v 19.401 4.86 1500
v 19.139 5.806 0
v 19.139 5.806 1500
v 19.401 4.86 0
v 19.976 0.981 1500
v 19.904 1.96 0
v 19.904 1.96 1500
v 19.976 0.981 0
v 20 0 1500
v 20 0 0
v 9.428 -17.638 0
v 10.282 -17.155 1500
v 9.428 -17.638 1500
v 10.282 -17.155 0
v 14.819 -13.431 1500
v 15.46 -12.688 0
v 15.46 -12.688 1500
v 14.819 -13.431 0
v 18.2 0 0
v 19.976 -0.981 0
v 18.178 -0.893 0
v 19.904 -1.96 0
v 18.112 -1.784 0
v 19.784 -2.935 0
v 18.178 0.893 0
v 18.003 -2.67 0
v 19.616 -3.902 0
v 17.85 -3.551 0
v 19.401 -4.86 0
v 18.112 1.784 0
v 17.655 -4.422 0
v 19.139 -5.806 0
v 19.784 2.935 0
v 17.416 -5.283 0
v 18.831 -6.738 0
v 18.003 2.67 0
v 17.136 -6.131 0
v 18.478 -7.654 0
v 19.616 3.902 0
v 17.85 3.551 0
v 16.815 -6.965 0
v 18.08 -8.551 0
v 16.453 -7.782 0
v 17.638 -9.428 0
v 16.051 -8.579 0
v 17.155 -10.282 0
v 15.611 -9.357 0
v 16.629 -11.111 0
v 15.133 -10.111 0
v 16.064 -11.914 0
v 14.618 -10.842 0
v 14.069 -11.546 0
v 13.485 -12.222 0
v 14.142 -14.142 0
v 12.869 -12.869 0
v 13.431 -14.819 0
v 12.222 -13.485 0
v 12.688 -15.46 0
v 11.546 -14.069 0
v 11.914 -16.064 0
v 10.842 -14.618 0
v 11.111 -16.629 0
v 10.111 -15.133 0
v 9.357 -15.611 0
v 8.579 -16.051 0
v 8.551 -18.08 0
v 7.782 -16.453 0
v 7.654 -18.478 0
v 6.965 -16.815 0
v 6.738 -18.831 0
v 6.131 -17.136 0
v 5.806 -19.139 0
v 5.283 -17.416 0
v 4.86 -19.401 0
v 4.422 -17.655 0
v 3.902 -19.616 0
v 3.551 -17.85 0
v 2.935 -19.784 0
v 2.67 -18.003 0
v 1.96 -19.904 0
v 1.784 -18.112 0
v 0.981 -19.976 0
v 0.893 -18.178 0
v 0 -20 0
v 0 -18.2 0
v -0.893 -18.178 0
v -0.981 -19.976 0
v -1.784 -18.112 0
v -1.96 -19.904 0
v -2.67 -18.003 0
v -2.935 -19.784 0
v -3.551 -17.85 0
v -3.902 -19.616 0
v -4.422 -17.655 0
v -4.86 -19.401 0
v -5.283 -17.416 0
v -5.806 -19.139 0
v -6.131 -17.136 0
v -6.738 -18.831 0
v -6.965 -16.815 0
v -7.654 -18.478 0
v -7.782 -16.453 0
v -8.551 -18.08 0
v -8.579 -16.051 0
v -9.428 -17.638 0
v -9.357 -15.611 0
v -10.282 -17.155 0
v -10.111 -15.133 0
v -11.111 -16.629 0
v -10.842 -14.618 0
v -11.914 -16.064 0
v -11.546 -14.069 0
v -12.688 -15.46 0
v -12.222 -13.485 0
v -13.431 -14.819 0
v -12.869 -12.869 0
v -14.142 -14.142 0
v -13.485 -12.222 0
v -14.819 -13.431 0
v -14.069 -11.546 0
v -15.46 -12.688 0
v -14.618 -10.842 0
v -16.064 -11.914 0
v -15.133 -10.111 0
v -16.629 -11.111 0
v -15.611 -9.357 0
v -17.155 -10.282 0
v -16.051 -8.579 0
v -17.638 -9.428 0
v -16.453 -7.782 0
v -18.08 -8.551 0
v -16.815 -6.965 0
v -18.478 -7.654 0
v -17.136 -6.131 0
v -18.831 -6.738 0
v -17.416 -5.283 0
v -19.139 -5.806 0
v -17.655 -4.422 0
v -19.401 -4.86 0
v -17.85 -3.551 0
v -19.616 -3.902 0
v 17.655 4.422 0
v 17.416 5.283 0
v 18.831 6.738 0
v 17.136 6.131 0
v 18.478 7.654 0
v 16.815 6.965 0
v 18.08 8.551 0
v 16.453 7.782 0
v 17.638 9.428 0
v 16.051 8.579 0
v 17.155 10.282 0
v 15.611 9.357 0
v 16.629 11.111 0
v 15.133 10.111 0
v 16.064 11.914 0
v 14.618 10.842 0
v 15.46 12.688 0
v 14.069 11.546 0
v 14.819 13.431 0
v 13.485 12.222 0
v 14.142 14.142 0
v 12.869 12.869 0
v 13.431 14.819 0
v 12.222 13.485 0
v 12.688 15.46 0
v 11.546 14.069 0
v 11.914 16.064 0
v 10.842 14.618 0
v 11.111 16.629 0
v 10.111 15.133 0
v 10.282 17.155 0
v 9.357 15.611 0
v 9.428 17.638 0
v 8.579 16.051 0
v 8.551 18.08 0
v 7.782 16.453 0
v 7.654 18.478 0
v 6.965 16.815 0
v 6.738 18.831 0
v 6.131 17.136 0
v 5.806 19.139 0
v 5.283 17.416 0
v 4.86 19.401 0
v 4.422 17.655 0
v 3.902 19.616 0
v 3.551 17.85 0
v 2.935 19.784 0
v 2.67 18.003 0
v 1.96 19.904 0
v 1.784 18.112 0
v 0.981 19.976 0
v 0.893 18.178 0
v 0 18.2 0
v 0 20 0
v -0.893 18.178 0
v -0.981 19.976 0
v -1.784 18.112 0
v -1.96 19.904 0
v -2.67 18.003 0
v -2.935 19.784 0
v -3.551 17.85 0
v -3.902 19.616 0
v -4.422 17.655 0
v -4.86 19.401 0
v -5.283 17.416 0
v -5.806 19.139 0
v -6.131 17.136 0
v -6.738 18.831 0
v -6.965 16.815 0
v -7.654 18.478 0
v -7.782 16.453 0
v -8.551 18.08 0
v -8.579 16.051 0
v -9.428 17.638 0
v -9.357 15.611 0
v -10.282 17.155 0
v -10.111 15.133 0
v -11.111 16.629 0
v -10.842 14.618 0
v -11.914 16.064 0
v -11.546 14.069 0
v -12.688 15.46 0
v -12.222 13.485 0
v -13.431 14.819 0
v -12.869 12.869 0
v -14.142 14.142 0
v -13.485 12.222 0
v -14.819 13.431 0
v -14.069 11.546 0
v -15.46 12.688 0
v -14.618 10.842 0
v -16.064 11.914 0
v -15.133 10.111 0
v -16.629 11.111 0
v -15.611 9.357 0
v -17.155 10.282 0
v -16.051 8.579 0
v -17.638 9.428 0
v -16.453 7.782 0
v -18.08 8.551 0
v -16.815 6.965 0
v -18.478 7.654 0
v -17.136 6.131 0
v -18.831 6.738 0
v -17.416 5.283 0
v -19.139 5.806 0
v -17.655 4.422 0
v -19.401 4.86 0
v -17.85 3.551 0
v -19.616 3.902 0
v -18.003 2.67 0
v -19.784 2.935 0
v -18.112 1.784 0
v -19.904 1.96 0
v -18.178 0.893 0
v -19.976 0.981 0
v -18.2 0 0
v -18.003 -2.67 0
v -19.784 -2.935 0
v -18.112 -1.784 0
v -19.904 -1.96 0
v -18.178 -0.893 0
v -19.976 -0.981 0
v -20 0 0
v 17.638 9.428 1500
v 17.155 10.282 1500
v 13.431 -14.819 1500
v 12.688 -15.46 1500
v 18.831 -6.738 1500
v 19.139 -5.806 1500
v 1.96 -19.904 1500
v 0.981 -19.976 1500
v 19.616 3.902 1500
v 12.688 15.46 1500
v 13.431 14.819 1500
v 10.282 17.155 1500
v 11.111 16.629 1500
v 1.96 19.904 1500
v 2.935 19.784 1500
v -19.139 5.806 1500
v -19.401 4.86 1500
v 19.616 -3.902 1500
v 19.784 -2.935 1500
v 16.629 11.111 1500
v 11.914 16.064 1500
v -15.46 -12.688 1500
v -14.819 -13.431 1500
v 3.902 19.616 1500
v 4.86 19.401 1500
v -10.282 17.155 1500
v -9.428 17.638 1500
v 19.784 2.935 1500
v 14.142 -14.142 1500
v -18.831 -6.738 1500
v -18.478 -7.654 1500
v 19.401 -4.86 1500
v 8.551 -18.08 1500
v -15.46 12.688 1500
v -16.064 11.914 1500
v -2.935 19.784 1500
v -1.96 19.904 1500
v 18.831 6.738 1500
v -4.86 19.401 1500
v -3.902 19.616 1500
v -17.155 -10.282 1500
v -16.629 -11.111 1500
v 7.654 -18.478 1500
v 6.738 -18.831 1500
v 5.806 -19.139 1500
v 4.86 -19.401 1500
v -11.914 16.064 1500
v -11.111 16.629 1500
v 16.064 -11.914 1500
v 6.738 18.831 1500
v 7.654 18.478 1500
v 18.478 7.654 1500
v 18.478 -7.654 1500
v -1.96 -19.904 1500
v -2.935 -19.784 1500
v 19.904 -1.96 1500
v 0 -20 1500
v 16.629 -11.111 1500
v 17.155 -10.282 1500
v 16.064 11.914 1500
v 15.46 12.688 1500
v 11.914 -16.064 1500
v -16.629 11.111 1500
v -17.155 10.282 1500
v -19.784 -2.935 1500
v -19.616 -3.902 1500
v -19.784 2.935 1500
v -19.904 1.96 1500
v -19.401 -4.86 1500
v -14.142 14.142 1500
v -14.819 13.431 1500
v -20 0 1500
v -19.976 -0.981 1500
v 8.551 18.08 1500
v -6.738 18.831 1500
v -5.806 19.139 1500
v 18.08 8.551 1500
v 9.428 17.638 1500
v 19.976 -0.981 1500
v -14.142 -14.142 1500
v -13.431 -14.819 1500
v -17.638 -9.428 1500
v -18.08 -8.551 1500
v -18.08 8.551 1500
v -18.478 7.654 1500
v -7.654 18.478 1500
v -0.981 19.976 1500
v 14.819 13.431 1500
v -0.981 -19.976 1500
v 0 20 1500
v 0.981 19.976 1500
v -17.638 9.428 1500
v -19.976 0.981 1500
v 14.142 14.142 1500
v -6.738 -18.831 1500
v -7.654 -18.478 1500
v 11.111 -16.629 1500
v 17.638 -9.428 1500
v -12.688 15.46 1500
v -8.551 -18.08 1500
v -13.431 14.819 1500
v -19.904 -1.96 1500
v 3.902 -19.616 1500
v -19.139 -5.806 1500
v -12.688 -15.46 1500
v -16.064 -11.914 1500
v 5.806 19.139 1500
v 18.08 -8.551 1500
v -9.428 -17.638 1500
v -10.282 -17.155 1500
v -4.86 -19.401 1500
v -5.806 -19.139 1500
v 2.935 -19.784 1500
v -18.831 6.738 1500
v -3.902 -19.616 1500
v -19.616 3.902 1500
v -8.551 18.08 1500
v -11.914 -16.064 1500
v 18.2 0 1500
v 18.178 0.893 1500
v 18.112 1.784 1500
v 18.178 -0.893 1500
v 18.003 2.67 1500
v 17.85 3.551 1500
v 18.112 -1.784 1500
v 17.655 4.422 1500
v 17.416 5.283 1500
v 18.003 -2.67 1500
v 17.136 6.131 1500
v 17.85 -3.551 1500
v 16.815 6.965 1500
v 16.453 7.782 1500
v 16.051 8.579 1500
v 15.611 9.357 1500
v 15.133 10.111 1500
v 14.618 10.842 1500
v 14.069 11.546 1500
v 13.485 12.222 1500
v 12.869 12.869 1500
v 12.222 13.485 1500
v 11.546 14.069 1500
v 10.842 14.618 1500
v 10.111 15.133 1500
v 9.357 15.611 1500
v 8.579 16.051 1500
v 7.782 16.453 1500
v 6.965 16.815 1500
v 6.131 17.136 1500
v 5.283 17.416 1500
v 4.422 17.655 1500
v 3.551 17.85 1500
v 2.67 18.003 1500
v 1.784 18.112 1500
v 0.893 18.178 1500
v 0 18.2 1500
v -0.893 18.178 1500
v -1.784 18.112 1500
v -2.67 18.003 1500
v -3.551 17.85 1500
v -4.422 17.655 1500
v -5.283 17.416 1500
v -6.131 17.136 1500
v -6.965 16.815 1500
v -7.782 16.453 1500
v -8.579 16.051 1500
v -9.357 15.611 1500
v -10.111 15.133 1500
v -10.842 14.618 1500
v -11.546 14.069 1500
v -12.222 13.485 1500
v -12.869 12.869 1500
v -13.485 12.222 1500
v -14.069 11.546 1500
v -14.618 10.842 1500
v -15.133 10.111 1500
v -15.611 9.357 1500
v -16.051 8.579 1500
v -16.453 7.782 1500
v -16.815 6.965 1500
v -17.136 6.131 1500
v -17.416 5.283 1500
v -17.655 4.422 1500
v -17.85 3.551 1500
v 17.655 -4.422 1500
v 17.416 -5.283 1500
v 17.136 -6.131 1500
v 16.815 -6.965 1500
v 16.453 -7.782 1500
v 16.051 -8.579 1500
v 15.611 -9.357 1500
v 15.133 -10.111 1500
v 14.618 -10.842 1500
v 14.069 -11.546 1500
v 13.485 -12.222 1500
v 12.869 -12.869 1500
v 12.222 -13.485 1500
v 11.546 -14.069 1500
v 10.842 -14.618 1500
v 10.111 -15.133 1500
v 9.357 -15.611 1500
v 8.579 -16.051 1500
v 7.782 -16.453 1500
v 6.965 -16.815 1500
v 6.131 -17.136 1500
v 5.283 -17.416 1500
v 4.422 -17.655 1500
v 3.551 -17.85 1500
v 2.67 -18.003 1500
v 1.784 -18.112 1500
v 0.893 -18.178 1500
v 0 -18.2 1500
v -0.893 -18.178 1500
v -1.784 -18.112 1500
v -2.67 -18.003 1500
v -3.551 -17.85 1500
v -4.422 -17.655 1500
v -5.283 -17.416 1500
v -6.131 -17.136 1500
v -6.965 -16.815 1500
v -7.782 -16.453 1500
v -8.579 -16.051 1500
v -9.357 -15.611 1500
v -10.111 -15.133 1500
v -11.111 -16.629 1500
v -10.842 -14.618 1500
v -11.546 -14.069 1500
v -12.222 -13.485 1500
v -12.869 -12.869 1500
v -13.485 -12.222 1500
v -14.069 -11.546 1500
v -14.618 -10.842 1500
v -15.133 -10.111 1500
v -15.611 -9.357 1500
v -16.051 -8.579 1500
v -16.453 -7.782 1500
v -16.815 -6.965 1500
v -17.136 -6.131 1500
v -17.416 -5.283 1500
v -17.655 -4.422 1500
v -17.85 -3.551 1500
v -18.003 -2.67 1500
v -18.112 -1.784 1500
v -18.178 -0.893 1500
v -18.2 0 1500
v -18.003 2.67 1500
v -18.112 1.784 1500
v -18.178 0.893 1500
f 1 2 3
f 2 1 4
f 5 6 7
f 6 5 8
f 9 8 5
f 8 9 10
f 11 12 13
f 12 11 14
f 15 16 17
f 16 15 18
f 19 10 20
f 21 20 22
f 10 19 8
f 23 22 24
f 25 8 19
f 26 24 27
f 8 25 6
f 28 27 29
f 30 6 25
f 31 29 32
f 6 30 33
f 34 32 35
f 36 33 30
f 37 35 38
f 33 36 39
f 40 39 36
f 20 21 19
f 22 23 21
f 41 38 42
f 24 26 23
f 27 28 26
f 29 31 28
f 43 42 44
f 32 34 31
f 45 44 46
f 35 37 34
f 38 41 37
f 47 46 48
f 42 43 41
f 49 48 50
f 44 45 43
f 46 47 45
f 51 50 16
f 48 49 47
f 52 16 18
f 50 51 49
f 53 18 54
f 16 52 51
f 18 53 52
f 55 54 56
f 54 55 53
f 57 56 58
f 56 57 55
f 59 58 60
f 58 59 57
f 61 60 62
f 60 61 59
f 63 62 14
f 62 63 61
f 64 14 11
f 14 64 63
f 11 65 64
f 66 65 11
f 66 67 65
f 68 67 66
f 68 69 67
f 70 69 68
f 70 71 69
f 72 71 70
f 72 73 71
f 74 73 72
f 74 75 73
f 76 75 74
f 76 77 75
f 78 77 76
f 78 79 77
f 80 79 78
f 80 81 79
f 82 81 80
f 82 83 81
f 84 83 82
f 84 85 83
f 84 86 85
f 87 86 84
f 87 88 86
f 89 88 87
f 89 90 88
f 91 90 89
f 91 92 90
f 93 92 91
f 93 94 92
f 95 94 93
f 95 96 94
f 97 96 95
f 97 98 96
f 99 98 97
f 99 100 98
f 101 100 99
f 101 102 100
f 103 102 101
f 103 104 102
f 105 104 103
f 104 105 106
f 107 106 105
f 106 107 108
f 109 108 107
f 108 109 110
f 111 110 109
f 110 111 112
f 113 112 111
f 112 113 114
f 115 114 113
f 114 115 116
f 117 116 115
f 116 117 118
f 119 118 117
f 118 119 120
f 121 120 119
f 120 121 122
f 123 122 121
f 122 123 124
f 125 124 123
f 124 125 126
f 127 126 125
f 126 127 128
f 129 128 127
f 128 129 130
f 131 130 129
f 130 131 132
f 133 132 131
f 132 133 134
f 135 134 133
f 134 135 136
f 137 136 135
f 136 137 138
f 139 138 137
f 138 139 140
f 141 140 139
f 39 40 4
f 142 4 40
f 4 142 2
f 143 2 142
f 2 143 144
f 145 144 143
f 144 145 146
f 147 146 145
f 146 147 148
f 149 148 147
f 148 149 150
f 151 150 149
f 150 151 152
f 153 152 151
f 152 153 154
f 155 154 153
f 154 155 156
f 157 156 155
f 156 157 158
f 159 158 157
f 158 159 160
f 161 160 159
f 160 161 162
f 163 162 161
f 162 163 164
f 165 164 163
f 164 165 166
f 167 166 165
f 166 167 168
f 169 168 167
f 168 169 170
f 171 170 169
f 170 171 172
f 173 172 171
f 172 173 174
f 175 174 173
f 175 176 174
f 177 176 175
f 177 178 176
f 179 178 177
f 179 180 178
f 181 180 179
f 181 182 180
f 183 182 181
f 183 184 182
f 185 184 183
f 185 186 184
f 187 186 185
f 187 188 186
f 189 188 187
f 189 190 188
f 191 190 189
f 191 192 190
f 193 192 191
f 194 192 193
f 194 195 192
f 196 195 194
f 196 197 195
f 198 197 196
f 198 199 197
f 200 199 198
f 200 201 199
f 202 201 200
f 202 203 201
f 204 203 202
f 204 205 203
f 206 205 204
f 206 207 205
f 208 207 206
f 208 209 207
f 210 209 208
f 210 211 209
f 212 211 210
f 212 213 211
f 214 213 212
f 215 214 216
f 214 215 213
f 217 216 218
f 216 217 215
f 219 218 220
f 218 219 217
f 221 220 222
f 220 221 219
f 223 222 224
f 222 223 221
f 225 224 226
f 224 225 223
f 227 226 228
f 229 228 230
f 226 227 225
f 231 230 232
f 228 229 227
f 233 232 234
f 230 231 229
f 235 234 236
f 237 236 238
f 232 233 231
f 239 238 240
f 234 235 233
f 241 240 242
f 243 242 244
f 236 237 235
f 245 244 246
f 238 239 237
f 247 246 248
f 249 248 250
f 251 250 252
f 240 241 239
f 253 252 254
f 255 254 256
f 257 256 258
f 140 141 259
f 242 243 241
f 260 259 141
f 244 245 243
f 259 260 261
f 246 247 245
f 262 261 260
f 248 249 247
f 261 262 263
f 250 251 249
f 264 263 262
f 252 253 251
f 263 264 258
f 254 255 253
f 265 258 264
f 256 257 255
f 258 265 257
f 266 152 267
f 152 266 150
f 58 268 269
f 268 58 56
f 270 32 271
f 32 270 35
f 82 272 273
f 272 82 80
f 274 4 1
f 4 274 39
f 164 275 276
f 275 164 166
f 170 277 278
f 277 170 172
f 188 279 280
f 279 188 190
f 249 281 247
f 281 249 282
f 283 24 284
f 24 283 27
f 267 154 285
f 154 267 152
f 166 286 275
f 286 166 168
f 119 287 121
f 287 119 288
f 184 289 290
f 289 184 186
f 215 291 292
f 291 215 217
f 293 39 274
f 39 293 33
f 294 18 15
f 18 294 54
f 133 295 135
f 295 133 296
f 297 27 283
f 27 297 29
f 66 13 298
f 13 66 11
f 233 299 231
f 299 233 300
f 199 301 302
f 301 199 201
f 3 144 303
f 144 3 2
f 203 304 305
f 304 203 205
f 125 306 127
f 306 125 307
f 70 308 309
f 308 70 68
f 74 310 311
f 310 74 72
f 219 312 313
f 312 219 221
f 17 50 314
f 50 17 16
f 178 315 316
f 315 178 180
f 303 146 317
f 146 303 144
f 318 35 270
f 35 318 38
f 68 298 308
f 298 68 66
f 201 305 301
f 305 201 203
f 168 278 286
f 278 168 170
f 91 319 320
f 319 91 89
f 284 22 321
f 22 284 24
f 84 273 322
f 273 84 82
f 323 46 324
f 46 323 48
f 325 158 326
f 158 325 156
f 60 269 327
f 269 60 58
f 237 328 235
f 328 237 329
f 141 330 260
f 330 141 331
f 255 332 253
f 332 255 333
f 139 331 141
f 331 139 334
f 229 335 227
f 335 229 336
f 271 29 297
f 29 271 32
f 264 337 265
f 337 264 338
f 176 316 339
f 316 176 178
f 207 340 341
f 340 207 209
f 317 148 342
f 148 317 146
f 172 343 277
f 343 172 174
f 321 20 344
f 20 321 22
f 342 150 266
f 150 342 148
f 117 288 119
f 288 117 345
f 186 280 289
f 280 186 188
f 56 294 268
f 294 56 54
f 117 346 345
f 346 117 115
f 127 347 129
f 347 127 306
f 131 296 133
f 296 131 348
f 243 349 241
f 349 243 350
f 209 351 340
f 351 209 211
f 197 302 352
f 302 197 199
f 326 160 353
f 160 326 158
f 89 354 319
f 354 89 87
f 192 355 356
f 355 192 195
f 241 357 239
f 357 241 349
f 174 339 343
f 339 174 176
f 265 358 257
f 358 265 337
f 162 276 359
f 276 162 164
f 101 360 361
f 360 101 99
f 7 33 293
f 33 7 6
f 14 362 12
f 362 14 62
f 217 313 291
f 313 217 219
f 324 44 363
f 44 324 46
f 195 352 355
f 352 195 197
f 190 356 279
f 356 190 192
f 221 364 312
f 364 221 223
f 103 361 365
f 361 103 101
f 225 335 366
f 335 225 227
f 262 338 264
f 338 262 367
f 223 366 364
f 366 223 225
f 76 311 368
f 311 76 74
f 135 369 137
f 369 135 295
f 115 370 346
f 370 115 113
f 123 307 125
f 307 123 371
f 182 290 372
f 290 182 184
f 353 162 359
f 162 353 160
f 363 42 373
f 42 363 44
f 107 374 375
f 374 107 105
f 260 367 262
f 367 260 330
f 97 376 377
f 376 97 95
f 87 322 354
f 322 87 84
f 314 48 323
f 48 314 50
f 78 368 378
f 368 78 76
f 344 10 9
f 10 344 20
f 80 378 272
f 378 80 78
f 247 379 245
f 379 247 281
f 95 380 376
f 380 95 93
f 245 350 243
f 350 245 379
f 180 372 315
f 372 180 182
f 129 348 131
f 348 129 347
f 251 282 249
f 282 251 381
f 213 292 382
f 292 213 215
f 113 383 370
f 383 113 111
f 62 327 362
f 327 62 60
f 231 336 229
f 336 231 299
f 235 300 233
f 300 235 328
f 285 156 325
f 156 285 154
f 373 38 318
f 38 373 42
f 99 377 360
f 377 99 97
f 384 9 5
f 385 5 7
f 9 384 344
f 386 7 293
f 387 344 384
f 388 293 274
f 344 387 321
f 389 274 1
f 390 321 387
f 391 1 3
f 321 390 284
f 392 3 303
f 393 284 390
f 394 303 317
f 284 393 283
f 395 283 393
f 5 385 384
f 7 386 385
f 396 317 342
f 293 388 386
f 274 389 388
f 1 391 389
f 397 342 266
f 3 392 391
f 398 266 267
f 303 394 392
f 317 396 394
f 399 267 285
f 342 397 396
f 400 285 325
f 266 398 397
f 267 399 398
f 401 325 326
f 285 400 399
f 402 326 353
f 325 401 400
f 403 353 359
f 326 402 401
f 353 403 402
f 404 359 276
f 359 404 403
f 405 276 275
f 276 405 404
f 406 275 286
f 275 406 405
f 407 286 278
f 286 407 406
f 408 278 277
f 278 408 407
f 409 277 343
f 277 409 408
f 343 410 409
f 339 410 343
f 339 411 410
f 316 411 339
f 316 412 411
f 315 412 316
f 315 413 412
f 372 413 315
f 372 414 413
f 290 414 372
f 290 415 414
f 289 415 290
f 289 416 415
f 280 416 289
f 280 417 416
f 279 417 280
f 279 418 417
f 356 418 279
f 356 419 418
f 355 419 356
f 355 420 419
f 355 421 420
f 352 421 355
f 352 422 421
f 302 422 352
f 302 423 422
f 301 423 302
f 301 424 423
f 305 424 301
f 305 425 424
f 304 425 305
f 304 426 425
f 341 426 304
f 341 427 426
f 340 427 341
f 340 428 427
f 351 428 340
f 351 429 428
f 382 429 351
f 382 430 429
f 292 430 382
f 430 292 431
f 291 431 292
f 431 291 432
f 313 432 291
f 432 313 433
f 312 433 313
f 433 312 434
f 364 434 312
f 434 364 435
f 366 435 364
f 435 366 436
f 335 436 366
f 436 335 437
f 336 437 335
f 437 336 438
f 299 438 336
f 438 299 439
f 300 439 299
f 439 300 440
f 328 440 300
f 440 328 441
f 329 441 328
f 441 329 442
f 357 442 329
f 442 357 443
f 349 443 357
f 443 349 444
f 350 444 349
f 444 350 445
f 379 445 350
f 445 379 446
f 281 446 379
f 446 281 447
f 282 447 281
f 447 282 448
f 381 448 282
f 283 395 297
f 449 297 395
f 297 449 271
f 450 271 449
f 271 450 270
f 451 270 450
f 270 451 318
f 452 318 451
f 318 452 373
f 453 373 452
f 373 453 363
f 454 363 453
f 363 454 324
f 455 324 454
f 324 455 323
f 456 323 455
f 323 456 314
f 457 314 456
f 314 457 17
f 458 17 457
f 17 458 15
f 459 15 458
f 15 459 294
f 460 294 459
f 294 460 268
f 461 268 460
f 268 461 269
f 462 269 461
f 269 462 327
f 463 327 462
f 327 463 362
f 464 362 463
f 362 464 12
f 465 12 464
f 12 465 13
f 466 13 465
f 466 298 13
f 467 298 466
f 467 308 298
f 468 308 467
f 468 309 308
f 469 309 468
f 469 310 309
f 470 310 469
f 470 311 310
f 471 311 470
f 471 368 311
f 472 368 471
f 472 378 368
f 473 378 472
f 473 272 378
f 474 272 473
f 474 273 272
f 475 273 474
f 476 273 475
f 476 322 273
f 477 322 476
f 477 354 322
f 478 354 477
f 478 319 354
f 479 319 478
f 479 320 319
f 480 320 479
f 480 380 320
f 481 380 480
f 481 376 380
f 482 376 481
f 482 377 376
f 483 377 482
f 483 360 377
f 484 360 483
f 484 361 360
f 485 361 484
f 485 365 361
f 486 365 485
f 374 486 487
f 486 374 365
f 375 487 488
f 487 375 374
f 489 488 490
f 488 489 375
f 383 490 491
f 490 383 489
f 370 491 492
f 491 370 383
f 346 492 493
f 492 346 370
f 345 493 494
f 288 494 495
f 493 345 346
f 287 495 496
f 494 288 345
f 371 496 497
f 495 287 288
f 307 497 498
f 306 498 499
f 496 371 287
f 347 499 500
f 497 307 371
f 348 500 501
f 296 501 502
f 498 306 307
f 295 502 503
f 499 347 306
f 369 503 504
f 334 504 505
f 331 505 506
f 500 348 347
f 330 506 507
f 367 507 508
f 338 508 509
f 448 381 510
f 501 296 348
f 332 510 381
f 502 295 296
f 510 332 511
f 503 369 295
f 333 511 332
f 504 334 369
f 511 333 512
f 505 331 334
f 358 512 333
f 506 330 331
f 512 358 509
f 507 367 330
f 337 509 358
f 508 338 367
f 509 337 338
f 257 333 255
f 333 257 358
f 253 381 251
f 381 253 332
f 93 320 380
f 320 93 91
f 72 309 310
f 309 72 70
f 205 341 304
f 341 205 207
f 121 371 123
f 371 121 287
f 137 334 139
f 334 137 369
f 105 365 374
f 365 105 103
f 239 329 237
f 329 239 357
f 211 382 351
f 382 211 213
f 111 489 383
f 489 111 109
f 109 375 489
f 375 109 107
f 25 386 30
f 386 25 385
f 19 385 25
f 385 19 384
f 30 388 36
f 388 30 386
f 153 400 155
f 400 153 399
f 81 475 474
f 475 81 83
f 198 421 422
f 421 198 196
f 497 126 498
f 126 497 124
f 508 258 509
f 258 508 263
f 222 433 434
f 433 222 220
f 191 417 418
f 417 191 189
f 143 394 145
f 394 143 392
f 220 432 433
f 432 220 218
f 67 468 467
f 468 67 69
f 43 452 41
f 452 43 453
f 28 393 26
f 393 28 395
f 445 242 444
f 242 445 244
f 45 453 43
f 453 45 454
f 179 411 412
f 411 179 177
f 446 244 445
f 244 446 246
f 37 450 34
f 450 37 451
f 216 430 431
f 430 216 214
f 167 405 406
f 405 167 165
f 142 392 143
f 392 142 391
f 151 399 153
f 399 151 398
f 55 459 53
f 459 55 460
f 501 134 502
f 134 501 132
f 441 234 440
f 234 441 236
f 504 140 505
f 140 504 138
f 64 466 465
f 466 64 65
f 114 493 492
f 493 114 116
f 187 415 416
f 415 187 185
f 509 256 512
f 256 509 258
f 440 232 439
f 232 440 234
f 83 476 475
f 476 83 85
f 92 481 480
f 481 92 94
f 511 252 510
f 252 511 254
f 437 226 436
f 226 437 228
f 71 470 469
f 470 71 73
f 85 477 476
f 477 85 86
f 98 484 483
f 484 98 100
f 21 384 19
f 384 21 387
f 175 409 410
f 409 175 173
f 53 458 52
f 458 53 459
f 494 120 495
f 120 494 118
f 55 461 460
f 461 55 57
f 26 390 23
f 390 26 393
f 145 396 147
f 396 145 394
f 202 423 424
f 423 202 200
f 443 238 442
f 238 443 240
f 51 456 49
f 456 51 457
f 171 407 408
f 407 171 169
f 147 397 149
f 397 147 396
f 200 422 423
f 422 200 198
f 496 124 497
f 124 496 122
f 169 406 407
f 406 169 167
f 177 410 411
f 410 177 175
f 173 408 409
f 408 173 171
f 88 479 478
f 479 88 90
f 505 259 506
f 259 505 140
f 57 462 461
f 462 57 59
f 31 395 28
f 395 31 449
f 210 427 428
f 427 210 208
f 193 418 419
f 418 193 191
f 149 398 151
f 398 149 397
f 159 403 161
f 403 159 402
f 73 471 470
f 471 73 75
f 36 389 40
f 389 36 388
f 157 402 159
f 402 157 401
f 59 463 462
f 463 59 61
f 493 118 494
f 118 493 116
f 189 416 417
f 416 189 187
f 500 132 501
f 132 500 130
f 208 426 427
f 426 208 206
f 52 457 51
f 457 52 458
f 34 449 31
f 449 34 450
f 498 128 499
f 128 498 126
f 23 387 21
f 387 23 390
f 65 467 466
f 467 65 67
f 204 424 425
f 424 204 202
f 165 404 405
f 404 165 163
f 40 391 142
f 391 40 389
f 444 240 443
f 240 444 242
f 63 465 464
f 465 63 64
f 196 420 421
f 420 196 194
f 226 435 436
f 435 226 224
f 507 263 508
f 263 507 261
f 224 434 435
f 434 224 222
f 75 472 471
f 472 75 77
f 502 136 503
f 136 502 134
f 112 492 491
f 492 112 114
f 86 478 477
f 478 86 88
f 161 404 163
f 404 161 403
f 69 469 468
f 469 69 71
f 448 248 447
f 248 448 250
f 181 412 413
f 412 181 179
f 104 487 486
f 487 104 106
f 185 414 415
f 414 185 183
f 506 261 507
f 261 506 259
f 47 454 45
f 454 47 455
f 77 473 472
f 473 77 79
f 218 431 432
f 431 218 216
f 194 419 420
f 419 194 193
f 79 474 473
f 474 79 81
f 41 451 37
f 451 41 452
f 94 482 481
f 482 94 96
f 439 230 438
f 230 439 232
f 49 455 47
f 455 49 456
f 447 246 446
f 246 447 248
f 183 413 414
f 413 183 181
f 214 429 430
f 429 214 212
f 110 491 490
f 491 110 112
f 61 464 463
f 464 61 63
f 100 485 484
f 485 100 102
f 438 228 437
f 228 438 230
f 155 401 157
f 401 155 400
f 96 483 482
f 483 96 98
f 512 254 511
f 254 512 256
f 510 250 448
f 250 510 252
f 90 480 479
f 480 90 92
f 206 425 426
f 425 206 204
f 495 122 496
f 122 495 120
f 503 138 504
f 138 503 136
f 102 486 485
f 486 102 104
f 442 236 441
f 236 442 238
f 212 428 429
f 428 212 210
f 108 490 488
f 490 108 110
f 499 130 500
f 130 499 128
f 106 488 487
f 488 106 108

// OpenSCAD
$fn = 128;

// HT 40 pipe (approx.): OD 40 mm, wall 1.8 mm, length 1500 mm
od = 40;
wall = 1.8;
id = od - 2*wall;
len = 1500;

module pipe(od, id, len) {
    difference() {
        cylinder(h = len, d = od);
        translate([0,0,-0.1]) cylinder(h = len + 0.2, d = id);
    }
}

pipe(od, id, len);
